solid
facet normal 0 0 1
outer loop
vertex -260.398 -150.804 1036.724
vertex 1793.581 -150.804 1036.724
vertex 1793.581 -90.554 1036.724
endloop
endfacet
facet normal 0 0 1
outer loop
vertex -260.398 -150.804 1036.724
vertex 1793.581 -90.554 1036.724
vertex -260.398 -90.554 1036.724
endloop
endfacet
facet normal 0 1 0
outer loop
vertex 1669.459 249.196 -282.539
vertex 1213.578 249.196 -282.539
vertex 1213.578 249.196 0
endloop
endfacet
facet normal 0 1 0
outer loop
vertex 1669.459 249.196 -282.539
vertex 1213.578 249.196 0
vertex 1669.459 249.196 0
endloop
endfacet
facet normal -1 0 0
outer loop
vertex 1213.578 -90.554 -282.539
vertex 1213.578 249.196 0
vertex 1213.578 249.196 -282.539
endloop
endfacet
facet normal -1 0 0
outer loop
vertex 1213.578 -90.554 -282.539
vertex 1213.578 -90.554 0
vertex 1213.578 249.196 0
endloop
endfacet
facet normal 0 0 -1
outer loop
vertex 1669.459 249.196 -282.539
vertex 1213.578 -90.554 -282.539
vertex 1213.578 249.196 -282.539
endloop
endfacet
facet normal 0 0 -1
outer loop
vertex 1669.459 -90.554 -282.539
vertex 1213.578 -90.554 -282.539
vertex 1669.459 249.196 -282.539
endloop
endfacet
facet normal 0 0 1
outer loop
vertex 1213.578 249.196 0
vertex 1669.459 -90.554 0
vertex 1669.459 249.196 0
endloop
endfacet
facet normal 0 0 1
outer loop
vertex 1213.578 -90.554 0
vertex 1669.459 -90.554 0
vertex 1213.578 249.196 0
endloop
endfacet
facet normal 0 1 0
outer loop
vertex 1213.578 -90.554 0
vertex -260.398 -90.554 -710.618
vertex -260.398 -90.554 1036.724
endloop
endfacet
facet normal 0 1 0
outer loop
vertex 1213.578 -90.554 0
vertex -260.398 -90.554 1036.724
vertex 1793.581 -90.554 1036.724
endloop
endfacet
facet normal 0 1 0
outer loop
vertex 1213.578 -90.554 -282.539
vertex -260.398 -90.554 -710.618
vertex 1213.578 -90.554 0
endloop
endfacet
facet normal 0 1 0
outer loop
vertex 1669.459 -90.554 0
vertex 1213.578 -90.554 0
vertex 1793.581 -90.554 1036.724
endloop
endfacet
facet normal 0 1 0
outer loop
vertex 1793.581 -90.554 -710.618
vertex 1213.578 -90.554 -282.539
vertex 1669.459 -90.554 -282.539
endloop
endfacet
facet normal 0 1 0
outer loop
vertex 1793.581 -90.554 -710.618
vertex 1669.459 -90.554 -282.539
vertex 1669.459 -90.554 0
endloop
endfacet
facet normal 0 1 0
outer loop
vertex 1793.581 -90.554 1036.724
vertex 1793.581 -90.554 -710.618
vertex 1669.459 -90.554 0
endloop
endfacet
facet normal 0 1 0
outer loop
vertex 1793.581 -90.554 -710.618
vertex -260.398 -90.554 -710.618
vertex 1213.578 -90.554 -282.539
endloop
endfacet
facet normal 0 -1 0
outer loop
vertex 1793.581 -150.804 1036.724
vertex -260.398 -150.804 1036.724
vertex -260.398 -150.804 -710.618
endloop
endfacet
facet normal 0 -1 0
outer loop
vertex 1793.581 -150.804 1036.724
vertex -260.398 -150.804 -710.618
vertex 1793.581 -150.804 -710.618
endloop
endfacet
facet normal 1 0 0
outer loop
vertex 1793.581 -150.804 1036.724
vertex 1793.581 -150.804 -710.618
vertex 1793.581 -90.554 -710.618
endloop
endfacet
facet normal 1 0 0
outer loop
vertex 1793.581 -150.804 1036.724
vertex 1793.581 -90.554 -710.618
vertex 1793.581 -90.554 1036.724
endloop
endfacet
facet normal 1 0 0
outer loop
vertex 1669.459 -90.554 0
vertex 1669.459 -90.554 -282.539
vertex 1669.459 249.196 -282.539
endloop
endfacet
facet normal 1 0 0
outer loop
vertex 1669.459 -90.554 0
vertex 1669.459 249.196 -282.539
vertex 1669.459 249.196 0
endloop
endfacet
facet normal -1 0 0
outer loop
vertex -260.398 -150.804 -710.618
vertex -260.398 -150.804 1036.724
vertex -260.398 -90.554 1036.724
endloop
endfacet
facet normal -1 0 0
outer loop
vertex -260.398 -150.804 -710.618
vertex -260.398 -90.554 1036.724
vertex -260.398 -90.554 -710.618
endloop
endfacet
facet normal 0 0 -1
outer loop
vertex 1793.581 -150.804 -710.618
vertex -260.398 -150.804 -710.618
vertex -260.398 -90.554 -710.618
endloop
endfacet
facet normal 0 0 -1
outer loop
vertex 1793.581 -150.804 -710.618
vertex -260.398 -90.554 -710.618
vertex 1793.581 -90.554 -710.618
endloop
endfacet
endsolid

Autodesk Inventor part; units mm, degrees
ref_plane "YZ Plane" through (0, 0, 0) normal (1, 0, 0) x (0, 1, 0)
ref_plane "XZ Plane" through (0, 0, 0) normal (0, 1, 0) x (-1, 0, 0)
ref_plane "XY Plane" through (0, 0, 0) normal (0, 0, 1) x (1, 0, 0)
ref_plane "РабПлоскость1" through (475.3287, -140.8035, 12.4703) normal (0, -1, 0) x (1, 0, 0)
sketch "Эскиз1" plane through (475.3287, -140.8035, 12.4703) normal (0, -1, 0) x (1, 0, 0)
  point P0 (-475.3287, -12.4703)
sketch "Эскиз2" plane through (475.3287, -140.8035, 12.4703) normal (0, -1, 0) x (1, 0, 0)
  line L0 (-735.7265, 1024.2535) -> (1318.2521, 1024.2535)
  line L1 (1318.2521, 1024.2535) -> (1318.2521, -723.0885)
  line L2 (1318.2521, -723.0885) -> (-735.7265, -723.0885)
  line L3 (-735.7265, -723.0885) -> (-735.7265, 1024.2535)
  point P0 (-475.3287, -12.4703)
extrude "Выдавливание1" add sketch "Эскиз2" along normal blind 10
sketch "Эскиз3" plane through (475.3287, -140.8035, 12.4703) normal (0, 1, 0) x (1, 0, 0)
  line L0 (1194.1306, 12.4703) -> (738.2489, 12.4703)
  line L1 (738.2489, 12.4703) -> (738.2489, 295.0097)
  line L2 (738.2489, 295.0097) -> (1194.1306, 295.0097)
  line L3 (1194.1306, 295.0097) -> (1194.1306, 12.4703)
  point P0 (-475.3287, 12.4703)
extrude "Выдавливание2" add sketch "Эскиз3" along normal blind 390
sketch "Эскиз4" plane through (475.3287, -140.8035, 12.4703) normal (0, 1, 0) x (1, 0, 0)
  line L0 (1194.1306, 295.0097) -> (1194.1306, 12.4703) projected
  line L1 (1194.1306, 12.4703) -> (738.2489, 12.4703) projected
  line L2 (738.2489, 12.4703) -> (738.2489, 295.0097) projected
  line L3 (738.2489, 295.0097) -> (1194.1306, 295.0097) projected
  line L4 (-735.7265, 723.0885) -> (1318.2521, 723.0885) projected
  line L5 (-735.7265, -1024.2535) -> (-735.7265, 723.0885) projected
  line L6 (1318.2521, -1024.2535) -> (-735.7265, -1024.2535) projected
  line L7 (1318.2521, 723.0885) -> (1318.2521, -1024.2535) projected
  point P0 (-475.3287, 12.4703)
extrude "Выдавливание3" add sketch "Эскиз4" along normal blind 50.25
properties part number "Земля_и_Препятствия"
